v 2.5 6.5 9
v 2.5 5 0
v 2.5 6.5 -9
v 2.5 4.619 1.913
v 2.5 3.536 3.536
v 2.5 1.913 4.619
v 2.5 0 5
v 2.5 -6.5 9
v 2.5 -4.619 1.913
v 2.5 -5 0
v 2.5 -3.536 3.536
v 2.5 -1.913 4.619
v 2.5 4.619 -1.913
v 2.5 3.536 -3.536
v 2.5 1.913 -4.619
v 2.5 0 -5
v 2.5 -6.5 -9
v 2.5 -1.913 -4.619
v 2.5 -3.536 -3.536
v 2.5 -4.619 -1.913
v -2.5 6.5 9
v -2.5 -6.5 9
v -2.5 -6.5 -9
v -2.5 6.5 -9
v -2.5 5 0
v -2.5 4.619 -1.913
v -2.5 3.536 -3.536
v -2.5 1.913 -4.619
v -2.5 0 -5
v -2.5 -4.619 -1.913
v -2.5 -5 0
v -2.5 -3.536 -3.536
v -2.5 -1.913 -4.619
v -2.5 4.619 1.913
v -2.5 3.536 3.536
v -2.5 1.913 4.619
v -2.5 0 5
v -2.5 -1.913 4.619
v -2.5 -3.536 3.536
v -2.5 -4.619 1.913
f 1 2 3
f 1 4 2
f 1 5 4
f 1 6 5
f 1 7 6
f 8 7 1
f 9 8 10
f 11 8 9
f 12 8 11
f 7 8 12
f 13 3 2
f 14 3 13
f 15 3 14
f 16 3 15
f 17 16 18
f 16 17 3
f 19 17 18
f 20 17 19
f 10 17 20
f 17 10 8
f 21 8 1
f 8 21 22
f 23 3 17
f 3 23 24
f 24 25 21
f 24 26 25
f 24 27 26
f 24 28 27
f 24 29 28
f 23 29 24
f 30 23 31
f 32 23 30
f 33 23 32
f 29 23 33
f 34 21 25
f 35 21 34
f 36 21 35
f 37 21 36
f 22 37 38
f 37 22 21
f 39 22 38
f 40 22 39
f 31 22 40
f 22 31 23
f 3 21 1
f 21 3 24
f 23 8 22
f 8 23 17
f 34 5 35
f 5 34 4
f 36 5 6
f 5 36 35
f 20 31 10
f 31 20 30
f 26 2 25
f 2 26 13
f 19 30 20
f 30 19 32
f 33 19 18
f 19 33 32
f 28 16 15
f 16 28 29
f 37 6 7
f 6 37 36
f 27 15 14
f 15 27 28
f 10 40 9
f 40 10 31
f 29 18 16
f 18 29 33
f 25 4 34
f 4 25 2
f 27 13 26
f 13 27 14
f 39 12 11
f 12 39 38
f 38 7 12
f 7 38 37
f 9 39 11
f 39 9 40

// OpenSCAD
a = 1;
b = 2;
c = 3;
echo(a, b, c);

let (a = 5, b = a + 8, c = a + b) {
	echo(a, b, c);
	difference() {
		cube([a, b, c], center = true);
		let (b = 2 * a, c = b * 2) {
			echo(a, b, c);
			rotate([0, 90, 0])
				cylinder(d = b, h = c, center = true);
		}
	}
}
